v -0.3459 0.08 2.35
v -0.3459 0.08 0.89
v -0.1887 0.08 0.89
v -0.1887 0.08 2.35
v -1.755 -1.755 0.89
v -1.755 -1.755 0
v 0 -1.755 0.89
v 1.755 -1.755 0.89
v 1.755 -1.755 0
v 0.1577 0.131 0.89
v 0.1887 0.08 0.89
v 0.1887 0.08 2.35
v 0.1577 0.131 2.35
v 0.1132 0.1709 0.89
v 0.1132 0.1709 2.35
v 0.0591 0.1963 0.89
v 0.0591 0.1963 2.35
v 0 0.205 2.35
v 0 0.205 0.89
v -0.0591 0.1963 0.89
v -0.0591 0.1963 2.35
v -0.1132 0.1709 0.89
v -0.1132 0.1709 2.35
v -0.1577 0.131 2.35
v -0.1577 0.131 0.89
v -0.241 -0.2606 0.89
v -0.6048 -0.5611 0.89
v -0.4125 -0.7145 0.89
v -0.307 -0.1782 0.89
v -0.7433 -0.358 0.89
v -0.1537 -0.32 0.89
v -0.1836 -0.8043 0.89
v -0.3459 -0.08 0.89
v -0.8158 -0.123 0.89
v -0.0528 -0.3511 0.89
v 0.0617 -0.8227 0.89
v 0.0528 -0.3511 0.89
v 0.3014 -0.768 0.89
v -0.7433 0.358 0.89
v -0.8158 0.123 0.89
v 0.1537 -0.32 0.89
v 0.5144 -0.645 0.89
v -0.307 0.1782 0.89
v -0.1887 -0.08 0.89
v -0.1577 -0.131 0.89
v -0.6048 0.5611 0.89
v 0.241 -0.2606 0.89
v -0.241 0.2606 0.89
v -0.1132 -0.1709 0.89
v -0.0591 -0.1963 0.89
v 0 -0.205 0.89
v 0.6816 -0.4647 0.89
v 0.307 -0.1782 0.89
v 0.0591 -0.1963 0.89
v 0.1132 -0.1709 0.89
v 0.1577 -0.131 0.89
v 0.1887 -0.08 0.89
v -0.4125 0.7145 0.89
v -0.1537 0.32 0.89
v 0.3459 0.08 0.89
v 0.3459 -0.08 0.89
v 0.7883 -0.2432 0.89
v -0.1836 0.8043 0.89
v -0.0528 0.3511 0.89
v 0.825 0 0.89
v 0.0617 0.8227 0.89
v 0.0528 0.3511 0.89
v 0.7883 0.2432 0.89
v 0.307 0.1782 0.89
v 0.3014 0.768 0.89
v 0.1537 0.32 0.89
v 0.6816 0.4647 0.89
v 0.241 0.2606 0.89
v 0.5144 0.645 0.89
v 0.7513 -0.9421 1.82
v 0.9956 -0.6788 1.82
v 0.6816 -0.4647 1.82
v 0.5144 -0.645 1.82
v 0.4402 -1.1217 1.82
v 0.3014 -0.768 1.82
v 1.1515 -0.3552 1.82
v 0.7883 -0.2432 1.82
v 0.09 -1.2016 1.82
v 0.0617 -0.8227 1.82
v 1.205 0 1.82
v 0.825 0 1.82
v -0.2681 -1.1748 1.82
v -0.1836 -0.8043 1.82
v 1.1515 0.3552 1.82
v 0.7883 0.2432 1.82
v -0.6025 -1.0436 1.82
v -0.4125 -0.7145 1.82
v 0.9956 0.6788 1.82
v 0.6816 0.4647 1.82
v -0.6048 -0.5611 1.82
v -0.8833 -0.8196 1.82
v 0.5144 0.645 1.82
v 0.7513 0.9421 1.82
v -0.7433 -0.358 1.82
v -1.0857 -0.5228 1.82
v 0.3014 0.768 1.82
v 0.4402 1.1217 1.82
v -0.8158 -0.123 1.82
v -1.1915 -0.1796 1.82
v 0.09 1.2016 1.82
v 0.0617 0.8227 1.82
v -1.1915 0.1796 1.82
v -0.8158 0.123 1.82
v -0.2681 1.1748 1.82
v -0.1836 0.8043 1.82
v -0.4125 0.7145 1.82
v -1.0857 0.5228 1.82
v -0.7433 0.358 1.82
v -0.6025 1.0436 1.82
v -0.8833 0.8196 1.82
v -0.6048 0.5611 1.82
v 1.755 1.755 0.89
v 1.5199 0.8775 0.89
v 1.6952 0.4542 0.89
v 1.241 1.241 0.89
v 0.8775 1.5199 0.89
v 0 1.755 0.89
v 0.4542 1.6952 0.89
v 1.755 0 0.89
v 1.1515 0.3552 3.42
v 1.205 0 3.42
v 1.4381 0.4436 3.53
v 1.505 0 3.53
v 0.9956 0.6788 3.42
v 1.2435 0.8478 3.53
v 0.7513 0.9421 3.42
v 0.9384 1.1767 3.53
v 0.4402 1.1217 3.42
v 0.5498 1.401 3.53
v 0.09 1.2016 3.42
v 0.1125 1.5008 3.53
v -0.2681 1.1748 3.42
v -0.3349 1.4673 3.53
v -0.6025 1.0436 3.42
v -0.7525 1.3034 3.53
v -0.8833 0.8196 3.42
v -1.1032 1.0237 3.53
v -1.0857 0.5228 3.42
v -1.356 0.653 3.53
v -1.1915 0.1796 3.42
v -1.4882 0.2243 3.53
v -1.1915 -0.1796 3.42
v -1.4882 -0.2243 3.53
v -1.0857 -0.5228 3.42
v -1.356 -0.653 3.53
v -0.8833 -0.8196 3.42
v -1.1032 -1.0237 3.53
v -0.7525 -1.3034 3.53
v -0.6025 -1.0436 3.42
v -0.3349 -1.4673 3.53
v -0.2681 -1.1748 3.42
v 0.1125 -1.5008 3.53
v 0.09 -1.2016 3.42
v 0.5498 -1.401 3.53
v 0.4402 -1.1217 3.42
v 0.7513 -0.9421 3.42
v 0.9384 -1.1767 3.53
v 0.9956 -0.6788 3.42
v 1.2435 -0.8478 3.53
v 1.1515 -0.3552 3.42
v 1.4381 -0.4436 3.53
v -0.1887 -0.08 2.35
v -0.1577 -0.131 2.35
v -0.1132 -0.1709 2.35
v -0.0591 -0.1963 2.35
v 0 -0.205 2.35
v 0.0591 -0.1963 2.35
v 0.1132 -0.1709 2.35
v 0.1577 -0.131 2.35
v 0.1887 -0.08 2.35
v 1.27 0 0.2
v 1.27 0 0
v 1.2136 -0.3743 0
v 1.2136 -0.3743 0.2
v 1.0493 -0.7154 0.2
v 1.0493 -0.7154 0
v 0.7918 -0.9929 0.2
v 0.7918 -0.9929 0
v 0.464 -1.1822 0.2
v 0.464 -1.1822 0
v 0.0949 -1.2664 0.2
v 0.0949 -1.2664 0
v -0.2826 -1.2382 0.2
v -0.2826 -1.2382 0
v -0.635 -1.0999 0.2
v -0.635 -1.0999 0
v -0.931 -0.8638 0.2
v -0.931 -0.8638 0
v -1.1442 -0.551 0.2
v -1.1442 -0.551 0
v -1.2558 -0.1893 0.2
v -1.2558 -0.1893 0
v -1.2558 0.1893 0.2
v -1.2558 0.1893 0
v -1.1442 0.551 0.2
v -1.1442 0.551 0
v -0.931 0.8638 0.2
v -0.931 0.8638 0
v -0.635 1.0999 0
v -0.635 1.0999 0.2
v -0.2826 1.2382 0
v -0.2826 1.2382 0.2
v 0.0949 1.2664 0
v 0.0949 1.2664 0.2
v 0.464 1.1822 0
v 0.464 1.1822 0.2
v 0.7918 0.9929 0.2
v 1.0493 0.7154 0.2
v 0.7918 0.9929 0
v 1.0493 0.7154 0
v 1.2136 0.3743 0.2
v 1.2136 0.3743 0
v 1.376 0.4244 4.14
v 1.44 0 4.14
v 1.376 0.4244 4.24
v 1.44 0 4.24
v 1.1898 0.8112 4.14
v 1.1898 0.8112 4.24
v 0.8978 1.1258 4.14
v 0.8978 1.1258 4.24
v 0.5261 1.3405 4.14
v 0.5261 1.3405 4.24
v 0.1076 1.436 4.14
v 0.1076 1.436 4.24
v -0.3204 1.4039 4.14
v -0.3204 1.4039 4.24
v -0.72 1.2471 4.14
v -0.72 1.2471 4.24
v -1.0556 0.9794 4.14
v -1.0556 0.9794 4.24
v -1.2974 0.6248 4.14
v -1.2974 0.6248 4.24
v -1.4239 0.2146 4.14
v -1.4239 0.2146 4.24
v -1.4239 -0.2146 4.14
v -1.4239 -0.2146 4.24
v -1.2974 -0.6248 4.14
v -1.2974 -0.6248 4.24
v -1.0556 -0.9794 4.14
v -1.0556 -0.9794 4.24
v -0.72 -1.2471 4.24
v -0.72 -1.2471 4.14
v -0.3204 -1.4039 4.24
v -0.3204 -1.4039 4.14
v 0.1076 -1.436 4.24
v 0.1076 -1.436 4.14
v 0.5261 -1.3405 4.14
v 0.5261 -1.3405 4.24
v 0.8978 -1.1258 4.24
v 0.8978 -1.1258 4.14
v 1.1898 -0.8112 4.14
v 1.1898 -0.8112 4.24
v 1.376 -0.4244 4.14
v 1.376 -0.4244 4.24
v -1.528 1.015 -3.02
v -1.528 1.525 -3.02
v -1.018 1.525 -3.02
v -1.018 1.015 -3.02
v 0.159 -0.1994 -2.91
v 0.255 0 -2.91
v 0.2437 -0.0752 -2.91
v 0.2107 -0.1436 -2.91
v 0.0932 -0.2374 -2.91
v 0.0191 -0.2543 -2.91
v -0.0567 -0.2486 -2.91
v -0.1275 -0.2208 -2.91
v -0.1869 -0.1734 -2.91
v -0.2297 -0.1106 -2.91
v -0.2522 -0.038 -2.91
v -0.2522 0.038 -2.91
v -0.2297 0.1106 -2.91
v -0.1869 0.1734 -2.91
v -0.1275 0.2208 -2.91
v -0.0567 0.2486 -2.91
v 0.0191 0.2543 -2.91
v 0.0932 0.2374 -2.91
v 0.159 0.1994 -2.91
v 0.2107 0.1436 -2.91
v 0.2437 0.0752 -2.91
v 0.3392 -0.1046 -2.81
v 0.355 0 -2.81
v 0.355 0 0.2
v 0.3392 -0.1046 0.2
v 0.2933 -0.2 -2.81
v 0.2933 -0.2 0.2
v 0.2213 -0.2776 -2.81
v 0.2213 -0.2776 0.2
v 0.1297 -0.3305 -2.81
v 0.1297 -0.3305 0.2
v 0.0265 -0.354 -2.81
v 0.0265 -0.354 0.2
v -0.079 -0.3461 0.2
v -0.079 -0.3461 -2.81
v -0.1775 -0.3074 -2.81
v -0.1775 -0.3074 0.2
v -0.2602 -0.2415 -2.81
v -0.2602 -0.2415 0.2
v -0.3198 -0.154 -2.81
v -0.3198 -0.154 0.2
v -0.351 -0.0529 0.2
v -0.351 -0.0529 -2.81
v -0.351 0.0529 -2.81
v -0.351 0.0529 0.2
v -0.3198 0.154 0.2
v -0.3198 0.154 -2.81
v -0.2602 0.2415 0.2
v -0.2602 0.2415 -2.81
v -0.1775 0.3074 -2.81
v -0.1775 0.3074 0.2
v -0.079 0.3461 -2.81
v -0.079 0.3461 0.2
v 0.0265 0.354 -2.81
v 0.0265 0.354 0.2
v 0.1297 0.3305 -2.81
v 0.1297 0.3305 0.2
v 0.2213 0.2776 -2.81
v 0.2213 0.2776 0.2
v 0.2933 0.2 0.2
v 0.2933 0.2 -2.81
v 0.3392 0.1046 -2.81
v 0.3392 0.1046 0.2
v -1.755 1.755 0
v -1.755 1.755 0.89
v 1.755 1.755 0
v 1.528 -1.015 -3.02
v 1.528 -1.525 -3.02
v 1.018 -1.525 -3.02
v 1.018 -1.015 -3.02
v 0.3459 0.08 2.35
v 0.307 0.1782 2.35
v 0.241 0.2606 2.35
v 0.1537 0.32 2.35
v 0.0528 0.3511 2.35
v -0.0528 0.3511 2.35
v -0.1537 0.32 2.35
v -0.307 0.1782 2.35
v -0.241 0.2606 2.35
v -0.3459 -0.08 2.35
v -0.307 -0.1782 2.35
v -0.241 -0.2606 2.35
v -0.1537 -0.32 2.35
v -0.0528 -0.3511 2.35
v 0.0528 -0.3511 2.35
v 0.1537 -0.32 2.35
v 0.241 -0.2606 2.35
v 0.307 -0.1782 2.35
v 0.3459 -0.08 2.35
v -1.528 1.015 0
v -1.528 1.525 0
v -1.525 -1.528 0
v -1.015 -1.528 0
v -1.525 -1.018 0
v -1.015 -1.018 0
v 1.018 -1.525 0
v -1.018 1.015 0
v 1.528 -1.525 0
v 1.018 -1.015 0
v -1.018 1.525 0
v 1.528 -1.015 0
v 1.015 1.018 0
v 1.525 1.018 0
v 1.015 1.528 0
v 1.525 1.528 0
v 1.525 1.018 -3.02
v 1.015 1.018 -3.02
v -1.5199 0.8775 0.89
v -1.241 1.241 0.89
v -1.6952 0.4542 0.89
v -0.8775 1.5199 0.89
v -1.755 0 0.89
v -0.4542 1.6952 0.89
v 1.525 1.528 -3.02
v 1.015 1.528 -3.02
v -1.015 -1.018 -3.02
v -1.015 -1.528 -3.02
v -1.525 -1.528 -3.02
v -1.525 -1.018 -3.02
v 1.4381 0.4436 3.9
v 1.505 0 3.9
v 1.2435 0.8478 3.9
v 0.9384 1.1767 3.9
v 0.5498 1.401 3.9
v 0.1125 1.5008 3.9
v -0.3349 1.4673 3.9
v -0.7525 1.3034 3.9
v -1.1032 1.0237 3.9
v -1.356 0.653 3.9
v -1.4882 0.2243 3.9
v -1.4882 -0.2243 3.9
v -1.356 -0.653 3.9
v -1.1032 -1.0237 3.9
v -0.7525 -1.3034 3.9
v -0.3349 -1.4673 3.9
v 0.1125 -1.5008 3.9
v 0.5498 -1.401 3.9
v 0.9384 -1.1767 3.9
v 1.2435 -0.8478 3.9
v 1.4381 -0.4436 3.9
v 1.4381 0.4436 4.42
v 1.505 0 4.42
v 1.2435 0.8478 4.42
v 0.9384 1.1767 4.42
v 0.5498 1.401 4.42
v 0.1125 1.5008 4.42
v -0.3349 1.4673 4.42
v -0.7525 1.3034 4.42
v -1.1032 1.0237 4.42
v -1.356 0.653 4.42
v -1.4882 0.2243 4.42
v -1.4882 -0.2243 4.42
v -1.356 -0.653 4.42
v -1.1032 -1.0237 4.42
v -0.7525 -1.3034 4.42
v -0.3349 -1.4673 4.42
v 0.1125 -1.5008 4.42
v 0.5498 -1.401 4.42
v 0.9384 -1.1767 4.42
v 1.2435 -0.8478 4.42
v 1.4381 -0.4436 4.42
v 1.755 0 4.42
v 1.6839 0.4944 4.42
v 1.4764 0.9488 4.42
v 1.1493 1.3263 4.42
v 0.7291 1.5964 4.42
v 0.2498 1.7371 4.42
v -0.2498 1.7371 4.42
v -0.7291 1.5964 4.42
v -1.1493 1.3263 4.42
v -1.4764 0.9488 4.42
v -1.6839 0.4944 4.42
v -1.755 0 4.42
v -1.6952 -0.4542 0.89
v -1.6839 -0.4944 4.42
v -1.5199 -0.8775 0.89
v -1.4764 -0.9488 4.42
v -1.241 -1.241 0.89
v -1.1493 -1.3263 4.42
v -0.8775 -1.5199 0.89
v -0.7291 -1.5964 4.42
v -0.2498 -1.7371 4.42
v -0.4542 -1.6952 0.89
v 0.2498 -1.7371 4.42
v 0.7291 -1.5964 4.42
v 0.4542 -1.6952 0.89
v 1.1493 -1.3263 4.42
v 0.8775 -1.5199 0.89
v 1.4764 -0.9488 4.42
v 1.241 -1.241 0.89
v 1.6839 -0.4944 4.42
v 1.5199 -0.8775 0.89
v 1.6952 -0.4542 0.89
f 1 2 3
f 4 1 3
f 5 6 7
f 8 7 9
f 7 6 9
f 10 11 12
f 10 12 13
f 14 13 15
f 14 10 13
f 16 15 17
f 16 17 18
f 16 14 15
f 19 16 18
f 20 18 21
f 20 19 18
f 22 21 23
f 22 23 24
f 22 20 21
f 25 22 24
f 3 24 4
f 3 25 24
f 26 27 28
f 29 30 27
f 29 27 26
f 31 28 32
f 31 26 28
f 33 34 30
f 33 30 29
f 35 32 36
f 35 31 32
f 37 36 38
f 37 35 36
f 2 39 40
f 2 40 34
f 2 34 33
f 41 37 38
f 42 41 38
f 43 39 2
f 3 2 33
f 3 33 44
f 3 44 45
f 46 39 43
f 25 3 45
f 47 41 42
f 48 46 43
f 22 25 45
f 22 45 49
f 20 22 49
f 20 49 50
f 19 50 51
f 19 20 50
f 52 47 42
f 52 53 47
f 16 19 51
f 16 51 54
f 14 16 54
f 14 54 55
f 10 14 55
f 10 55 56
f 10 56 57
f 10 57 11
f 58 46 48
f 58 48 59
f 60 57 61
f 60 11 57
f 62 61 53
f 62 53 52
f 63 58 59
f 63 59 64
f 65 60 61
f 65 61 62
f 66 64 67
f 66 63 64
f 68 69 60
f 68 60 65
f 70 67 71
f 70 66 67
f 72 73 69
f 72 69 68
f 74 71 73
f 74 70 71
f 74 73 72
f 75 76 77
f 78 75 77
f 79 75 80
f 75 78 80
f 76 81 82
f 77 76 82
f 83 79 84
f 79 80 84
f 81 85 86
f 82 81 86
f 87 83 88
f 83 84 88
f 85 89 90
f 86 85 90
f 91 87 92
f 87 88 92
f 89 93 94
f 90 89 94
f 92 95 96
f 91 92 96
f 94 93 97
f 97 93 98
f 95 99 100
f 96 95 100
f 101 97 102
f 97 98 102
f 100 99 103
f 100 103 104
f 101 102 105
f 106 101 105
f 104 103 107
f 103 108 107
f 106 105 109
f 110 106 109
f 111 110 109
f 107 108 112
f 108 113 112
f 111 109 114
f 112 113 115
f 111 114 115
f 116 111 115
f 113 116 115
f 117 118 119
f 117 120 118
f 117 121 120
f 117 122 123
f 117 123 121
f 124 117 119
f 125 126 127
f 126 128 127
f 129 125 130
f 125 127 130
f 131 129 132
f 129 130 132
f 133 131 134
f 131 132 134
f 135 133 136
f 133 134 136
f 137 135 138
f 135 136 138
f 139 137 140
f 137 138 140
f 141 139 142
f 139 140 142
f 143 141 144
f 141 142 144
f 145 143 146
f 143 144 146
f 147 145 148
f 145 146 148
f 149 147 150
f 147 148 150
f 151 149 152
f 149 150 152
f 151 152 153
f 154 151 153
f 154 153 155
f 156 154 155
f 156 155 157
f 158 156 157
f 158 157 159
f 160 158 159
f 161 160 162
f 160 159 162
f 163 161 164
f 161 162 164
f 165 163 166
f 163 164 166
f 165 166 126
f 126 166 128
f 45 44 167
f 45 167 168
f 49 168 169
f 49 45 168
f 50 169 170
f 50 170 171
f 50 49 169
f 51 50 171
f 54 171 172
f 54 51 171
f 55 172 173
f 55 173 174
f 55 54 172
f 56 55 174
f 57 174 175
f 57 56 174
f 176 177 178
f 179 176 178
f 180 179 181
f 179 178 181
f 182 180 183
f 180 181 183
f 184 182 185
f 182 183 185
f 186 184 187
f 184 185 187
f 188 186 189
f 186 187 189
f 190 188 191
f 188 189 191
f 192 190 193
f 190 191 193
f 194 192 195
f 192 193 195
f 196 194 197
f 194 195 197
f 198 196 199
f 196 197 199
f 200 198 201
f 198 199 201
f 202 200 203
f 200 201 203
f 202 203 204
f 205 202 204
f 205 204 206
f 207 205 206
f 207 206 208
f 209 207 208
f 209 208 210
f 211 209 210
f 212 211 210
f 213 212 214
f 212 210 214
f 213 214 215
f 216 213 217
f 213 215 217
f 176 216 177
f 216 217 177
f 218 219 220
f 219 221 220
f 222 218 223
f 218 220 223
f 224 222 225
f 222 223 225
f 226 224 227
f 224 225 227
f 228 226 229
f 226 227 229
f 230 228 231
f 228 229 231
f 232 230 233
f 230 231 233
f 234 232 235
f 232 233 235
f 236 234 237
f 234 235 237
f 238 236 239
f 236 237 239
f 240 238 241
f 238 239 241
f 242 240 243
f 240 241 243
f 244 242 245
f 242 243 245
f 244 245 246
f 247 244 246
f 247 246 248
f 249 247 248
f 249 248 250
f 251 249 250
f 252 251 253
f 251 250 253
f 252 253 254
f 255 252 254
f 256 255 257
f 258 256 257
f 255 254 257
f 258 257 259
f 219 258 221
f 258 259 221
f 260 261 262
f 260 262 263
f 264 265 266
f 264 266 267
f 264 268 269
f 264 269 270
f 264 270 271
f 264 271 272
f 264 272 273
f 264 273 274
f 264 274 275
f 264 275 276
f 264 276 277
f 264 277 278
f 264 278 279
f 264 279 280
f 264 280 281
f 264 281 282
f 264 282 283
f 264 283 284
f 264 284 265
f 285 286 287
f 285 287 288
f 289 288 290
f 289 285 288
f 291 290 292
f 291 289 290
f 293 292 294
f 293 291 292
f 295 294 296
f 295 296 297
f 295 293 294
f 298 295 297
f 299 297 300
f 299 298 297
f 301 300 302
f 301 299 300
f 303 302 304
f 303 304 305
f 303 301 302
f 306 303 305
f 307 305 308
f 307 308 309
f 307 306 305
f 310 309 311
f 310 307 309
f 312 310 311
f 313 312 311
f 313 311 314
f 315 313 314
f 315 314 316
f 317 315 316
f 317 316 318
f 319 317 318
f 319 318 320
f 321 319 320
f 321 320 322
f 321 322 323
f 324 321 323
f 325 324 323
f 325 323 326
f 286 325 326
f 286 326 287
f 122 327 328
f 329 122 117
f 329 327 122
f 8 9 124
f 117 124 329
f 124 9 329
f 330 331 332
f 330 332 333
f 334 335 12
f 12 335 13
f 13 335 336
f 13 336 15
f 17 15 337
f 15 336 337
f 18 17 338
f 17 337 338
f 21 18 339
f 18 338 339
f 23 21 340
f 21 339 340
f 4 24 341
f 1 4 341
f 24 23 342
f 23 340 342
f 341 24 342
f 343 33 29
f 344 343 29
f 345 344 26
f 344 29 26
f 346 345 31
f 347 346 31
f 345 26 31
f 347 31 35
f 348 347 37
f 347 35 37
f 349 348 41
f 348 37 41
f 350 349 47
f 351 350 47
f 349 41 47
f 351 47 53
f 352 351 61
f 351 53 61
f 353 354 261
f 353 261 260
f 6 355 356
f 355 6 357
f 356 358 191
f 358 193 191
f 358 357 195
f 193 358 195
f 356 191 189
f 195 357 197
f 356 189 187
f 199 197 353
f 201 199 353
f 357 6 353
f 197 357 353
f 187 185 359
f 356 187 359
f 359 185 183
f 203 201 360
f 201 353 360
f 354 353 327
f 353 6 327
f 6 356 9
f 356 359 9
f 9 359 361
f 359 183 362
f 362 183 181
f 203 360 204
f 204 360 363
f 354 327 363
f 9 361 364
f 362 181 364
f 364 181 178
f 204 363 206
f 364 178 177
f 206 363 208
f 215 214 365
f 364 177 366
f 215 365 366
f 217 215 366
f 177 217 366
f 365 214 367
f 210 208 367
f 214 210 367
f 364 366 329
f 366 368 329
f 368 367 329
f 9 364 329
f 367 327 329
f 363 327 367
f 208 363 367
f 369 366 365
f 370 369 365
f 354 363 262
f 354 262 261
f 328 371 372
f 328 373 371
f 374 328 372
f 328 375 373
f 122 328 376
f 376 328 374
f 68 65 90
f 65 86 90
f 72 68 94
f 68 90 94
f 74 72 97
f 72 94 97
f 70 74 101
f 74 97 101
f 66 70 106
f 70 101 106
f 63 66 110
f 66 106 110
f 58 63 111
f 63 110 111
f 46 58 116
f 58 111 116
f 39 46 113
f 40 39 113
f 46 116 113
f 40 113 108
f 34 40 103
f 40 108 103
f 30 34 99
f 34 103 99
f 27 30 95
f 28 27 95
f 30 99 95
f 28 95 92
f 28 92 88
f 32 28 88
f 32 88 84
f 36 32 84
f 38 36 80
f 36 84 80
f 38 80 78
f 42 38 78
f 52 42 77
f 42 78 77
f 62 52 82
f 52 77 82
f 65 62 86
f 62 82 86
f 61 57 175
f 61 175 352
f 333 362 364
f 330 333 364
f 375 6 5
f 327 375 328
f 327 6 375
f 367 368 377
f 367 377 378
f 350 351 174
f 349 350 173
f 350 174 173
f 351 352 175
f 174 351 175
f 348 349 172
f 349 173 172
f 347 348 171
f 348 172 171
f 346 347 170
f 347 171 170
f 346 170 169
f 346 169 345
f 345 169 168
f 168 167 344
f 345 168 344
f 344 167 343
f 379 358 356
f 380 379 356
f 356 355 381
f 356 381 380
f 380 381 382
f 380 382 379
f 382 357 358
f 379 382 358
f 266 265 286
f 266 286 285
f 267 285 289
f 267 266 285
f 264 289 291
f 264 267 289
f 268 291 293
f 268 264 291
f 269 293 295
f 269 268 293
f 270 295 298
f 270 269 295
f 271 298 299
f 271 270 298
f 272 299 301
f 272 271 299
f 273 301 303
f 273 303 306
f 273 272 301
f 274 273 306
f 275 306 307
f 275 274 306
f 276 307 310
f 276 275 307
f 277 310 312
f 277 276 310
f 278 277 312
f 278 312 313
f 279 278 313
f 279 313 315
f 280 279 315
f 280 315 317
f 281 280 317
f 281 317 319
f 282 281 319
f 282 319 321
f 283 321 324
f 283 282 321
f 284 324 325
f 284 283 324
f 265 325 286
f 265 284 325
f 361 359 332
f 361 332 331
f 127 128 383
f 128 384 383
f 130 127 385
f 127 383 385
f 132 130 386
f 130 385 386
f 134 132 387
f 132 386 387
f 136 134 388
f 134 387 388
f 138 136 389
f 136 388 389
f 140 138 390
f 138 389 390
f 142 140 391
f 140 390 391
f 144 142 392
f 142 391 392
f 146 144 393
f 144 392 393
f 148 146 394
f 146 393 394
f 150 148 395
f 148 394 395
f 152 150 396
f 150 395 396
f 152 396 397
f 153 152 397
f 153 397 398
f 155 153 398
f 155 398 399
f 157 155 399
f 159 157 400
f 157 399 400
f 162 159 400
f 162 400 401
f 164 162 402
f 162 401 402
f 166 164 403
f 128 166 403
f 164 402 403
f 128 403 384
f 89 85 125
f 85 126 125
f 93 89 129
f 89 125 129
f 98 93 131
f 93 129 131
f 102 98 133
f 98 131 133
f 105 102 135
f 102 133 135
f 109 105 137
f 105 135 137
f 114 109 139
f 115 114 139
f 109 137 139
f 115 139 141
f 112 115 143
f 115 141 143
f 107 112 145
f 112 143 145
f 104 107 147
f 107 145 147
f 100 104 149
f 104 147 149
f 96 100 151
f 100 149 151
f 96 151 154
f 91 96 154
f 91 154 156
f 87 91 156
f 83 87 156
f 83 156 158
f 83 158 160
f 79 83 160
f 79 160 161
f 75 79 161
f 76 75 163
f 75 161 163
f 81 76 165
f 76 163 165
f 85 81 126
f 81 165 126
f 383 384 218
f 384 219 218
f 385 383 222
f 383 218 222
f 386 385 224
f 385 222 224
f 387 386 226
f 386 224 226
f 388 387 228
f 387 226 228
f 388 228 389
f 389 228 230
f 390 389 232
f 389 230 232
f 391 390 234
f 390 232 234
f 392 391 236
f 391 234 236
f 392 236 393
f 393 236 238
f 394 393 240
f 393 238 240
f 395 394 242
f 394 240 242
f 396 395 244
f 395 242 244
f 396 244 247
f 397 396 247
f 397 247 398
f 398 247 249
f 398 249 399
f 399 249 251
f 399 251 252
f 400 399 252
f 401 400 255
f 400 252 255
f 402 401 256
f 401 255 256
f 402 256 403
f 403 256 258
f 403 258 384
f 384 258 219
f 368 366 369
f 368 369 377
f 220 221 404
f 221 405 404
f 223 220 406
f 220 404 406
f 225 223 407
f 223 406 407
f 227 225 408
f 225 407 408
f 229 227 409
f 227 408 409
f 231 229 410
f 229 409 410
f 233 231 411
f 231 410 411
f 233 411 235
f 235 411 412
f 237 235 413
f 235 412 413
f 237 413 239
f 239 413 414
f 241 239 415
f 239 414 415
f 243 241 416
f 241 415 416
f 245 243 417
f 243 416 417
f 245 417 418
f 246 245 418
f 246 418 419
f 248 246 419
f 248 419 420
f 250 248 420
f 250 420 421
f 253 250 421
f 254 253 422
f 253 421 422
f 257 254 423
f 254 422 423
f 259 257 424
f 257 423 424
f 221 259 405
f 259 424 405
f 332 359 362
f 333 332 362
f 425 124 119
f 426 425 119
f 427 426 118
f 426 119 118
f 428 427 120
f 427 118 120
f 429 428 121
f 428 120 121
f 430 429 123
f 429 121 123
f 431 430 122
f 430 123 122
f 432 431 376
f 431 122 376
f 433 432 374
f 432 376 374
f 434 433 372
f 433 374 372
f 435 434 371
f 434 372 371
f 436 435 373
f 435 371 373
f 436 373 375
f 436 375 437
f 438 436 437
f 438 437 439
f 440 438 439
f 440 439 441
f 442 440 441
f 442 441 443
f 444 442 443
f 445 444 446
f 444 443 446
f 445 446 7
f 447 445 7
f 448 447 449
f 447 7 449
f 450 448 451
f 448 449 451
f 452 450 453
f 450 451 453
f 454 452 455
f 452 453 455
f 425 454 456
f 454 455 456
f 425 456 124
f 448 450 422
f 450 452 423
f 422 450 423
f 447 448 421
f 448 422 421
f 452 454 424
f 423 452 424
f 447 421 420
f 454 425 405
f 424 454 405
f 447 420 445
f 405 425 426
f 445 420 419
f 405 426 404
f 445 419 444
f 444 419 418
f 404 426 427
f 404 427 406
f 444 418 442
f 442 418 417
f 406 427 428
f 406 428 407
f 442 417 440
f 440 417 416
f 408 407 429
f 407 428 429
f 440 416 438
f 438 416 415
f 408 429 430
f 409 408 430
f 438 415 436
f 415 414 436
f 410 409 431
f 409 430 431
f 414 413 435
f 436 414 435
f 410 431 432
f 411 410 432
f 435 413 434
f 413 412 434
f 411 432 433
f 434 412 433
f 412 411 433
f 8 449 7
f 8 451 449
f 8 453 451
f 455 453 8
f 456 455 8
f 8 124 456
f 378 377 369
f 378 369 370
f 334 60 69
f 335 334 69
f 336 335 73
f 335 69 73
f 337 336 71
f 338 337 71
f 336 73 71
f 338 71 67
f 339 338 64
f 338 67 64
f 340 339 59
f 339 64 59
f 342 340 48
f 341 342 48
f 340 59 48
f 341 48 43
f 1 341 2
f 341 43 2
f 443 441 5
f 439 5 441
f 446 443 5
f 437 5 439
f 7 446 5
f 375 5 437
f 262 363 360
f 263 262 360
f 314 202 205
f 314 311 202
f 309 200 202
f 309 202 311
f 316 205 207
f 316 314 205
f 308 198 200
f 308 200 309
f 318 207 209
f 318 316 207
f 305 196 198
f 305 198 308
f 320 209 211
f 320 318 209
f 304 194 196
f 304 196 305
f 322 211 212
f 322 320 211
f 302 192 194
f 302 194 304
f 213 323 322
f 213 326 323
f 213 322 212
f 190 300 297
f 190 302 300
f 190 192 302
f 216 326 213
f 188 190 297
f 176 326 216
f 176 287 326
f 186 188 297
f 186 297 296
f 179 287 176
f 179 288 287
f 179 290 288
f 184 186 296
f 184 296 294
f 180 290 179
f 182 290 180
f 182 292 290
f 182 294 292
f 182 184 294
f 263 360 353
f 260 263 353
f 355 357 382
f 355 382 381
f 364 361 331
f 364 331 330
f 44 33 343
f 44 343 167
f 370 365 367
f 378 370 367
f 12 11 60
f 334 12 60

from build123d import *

# Parameters (mm, degrees)
SKETCH_W           = 3.51
SKETCH_H           = 3.51
PAD_DEPTH          = 0.89
SKETCH003_R        = 0.355
PAD002_DEPTH       = 2.91
PAD003_DEPTH       = 1.46
SKETCH005_R        = 1.27
SKETCH005_R_2      = 0.355
POCKET_DEPTH       = 0.2
SKETCH002_W        = 0.51
SKETCH002_H        = 0.51
PAD005_DEPTH       = 3.02
POLARPATTERN_COUNT = 4
CHAMFER_SIZE       = 0.1


with BuildPart() as part:
    # Sketch → Pad (new body)
    with BuildSketch(Plane.XY):
        Rectangle(SKETCH_W, SKETCH_H)
    extrude(amount=PAD_DEPTH)

    # Sketch001 → Revolution (revolve)
    with BuildSketch(Plane.XZ):
        Polygon((1.755, 0.89), (0.825, 0.89), (0.825, 1.82), (1.205, 1.82), (1.205, 3.42), (1.505, 3.53), (1.505, 3.9), (1.44, 4.14), (1.44, 4.24), (1.505, 4.42), (1.755, 4.42), align=None)
    revolve(axis=Axis((0, 0, 0), (0, 0, 1)))

    # Sketch003 → Pad002 (join)
    with BuildSketch(Plane(origin=(0, 0, 0), x_dir=(1, 0, 0), z_dir=(0, 0, -1))):
        Circle(SKETCH003_R)
    extrude(amount=PAD002_DEPTH)

    # Sketch004 → Pad003 (join)
    with BuildSketch(Plane.XY.offset(0.89)):
        with BuildLine():
            ThreePointArc((0.188746, 0.08), (0, 0.205), (-0.188746, 0.08))
            Line((-0.345868, 0.08), (-0.188746, 0.08))
            ThreePointArc((0.345868, 0.08), (0, 0.355), (-0.345868, 0.08))
            Line((0.188746, 0.08), (0.345868, 0.08))
        make_face()
        with BuildLine():
            ThreePointArc((-0.188746, -0.08), (0, -0.205), (0.188746, -0.08))
            Line((0.188746, -0.08), (0.345868, -0.08))
            ThreePointArc((-0.345868, -0.08), (0, -0.355), (0.345868, -0.08))
            Line((-0.345868, -0.08), (-0.188746, -0.08))
        make_face()
    extrude(amount=PAD003_DEPTH)

    # Sketch005 (on Face3 of Pad003) → Pocket (cut)
    with BuildSketch(Plane(origin=(0, 0, 0), x_dir=(1, 0, 0), z_dir=(0, 0, -1))):
        Circle(SKETCH005_R)
        Circle(SKETCH005_R_2, mode=Mode.SUBTRACT)
    extrude(amount=-POCKET_DEPTH, mode=Mode.SUBTRACT)

    # Sketch002 (on Face1 of Revolution) → Pad005 (join)
    with BuildSketch(Plane(origin=(0, 0, 0), x_dir=(1, 0, 0), z_dir=(0, 0, -1))):
        with Locations((-1.27, 1.273)):
            Rectangle(SKETCH002_W, SKETCH002_H)
    pad005 = extrude(amount=PAD005_DEPTH)

    # PolarPattern: Pad005 ×4 about axis
    polarpattern_axis = Axis((0, 0, 0), (0, 0, -1))
    for i in range(1, POLARPATTERN_COUNT):
        add(pad005.rotate(polarpattern_axis, i * 360 / POLARPATTERN_COUNT))

    # Chamfer
    chamfer_edges = [part.edges().sort_by_distance(p)[0] for p in [
        (-0.355, 0, -2.91),
    ]]
    chamfer(chamfer_edges, length=CHAMFER_SIZE)


solid = part.part
